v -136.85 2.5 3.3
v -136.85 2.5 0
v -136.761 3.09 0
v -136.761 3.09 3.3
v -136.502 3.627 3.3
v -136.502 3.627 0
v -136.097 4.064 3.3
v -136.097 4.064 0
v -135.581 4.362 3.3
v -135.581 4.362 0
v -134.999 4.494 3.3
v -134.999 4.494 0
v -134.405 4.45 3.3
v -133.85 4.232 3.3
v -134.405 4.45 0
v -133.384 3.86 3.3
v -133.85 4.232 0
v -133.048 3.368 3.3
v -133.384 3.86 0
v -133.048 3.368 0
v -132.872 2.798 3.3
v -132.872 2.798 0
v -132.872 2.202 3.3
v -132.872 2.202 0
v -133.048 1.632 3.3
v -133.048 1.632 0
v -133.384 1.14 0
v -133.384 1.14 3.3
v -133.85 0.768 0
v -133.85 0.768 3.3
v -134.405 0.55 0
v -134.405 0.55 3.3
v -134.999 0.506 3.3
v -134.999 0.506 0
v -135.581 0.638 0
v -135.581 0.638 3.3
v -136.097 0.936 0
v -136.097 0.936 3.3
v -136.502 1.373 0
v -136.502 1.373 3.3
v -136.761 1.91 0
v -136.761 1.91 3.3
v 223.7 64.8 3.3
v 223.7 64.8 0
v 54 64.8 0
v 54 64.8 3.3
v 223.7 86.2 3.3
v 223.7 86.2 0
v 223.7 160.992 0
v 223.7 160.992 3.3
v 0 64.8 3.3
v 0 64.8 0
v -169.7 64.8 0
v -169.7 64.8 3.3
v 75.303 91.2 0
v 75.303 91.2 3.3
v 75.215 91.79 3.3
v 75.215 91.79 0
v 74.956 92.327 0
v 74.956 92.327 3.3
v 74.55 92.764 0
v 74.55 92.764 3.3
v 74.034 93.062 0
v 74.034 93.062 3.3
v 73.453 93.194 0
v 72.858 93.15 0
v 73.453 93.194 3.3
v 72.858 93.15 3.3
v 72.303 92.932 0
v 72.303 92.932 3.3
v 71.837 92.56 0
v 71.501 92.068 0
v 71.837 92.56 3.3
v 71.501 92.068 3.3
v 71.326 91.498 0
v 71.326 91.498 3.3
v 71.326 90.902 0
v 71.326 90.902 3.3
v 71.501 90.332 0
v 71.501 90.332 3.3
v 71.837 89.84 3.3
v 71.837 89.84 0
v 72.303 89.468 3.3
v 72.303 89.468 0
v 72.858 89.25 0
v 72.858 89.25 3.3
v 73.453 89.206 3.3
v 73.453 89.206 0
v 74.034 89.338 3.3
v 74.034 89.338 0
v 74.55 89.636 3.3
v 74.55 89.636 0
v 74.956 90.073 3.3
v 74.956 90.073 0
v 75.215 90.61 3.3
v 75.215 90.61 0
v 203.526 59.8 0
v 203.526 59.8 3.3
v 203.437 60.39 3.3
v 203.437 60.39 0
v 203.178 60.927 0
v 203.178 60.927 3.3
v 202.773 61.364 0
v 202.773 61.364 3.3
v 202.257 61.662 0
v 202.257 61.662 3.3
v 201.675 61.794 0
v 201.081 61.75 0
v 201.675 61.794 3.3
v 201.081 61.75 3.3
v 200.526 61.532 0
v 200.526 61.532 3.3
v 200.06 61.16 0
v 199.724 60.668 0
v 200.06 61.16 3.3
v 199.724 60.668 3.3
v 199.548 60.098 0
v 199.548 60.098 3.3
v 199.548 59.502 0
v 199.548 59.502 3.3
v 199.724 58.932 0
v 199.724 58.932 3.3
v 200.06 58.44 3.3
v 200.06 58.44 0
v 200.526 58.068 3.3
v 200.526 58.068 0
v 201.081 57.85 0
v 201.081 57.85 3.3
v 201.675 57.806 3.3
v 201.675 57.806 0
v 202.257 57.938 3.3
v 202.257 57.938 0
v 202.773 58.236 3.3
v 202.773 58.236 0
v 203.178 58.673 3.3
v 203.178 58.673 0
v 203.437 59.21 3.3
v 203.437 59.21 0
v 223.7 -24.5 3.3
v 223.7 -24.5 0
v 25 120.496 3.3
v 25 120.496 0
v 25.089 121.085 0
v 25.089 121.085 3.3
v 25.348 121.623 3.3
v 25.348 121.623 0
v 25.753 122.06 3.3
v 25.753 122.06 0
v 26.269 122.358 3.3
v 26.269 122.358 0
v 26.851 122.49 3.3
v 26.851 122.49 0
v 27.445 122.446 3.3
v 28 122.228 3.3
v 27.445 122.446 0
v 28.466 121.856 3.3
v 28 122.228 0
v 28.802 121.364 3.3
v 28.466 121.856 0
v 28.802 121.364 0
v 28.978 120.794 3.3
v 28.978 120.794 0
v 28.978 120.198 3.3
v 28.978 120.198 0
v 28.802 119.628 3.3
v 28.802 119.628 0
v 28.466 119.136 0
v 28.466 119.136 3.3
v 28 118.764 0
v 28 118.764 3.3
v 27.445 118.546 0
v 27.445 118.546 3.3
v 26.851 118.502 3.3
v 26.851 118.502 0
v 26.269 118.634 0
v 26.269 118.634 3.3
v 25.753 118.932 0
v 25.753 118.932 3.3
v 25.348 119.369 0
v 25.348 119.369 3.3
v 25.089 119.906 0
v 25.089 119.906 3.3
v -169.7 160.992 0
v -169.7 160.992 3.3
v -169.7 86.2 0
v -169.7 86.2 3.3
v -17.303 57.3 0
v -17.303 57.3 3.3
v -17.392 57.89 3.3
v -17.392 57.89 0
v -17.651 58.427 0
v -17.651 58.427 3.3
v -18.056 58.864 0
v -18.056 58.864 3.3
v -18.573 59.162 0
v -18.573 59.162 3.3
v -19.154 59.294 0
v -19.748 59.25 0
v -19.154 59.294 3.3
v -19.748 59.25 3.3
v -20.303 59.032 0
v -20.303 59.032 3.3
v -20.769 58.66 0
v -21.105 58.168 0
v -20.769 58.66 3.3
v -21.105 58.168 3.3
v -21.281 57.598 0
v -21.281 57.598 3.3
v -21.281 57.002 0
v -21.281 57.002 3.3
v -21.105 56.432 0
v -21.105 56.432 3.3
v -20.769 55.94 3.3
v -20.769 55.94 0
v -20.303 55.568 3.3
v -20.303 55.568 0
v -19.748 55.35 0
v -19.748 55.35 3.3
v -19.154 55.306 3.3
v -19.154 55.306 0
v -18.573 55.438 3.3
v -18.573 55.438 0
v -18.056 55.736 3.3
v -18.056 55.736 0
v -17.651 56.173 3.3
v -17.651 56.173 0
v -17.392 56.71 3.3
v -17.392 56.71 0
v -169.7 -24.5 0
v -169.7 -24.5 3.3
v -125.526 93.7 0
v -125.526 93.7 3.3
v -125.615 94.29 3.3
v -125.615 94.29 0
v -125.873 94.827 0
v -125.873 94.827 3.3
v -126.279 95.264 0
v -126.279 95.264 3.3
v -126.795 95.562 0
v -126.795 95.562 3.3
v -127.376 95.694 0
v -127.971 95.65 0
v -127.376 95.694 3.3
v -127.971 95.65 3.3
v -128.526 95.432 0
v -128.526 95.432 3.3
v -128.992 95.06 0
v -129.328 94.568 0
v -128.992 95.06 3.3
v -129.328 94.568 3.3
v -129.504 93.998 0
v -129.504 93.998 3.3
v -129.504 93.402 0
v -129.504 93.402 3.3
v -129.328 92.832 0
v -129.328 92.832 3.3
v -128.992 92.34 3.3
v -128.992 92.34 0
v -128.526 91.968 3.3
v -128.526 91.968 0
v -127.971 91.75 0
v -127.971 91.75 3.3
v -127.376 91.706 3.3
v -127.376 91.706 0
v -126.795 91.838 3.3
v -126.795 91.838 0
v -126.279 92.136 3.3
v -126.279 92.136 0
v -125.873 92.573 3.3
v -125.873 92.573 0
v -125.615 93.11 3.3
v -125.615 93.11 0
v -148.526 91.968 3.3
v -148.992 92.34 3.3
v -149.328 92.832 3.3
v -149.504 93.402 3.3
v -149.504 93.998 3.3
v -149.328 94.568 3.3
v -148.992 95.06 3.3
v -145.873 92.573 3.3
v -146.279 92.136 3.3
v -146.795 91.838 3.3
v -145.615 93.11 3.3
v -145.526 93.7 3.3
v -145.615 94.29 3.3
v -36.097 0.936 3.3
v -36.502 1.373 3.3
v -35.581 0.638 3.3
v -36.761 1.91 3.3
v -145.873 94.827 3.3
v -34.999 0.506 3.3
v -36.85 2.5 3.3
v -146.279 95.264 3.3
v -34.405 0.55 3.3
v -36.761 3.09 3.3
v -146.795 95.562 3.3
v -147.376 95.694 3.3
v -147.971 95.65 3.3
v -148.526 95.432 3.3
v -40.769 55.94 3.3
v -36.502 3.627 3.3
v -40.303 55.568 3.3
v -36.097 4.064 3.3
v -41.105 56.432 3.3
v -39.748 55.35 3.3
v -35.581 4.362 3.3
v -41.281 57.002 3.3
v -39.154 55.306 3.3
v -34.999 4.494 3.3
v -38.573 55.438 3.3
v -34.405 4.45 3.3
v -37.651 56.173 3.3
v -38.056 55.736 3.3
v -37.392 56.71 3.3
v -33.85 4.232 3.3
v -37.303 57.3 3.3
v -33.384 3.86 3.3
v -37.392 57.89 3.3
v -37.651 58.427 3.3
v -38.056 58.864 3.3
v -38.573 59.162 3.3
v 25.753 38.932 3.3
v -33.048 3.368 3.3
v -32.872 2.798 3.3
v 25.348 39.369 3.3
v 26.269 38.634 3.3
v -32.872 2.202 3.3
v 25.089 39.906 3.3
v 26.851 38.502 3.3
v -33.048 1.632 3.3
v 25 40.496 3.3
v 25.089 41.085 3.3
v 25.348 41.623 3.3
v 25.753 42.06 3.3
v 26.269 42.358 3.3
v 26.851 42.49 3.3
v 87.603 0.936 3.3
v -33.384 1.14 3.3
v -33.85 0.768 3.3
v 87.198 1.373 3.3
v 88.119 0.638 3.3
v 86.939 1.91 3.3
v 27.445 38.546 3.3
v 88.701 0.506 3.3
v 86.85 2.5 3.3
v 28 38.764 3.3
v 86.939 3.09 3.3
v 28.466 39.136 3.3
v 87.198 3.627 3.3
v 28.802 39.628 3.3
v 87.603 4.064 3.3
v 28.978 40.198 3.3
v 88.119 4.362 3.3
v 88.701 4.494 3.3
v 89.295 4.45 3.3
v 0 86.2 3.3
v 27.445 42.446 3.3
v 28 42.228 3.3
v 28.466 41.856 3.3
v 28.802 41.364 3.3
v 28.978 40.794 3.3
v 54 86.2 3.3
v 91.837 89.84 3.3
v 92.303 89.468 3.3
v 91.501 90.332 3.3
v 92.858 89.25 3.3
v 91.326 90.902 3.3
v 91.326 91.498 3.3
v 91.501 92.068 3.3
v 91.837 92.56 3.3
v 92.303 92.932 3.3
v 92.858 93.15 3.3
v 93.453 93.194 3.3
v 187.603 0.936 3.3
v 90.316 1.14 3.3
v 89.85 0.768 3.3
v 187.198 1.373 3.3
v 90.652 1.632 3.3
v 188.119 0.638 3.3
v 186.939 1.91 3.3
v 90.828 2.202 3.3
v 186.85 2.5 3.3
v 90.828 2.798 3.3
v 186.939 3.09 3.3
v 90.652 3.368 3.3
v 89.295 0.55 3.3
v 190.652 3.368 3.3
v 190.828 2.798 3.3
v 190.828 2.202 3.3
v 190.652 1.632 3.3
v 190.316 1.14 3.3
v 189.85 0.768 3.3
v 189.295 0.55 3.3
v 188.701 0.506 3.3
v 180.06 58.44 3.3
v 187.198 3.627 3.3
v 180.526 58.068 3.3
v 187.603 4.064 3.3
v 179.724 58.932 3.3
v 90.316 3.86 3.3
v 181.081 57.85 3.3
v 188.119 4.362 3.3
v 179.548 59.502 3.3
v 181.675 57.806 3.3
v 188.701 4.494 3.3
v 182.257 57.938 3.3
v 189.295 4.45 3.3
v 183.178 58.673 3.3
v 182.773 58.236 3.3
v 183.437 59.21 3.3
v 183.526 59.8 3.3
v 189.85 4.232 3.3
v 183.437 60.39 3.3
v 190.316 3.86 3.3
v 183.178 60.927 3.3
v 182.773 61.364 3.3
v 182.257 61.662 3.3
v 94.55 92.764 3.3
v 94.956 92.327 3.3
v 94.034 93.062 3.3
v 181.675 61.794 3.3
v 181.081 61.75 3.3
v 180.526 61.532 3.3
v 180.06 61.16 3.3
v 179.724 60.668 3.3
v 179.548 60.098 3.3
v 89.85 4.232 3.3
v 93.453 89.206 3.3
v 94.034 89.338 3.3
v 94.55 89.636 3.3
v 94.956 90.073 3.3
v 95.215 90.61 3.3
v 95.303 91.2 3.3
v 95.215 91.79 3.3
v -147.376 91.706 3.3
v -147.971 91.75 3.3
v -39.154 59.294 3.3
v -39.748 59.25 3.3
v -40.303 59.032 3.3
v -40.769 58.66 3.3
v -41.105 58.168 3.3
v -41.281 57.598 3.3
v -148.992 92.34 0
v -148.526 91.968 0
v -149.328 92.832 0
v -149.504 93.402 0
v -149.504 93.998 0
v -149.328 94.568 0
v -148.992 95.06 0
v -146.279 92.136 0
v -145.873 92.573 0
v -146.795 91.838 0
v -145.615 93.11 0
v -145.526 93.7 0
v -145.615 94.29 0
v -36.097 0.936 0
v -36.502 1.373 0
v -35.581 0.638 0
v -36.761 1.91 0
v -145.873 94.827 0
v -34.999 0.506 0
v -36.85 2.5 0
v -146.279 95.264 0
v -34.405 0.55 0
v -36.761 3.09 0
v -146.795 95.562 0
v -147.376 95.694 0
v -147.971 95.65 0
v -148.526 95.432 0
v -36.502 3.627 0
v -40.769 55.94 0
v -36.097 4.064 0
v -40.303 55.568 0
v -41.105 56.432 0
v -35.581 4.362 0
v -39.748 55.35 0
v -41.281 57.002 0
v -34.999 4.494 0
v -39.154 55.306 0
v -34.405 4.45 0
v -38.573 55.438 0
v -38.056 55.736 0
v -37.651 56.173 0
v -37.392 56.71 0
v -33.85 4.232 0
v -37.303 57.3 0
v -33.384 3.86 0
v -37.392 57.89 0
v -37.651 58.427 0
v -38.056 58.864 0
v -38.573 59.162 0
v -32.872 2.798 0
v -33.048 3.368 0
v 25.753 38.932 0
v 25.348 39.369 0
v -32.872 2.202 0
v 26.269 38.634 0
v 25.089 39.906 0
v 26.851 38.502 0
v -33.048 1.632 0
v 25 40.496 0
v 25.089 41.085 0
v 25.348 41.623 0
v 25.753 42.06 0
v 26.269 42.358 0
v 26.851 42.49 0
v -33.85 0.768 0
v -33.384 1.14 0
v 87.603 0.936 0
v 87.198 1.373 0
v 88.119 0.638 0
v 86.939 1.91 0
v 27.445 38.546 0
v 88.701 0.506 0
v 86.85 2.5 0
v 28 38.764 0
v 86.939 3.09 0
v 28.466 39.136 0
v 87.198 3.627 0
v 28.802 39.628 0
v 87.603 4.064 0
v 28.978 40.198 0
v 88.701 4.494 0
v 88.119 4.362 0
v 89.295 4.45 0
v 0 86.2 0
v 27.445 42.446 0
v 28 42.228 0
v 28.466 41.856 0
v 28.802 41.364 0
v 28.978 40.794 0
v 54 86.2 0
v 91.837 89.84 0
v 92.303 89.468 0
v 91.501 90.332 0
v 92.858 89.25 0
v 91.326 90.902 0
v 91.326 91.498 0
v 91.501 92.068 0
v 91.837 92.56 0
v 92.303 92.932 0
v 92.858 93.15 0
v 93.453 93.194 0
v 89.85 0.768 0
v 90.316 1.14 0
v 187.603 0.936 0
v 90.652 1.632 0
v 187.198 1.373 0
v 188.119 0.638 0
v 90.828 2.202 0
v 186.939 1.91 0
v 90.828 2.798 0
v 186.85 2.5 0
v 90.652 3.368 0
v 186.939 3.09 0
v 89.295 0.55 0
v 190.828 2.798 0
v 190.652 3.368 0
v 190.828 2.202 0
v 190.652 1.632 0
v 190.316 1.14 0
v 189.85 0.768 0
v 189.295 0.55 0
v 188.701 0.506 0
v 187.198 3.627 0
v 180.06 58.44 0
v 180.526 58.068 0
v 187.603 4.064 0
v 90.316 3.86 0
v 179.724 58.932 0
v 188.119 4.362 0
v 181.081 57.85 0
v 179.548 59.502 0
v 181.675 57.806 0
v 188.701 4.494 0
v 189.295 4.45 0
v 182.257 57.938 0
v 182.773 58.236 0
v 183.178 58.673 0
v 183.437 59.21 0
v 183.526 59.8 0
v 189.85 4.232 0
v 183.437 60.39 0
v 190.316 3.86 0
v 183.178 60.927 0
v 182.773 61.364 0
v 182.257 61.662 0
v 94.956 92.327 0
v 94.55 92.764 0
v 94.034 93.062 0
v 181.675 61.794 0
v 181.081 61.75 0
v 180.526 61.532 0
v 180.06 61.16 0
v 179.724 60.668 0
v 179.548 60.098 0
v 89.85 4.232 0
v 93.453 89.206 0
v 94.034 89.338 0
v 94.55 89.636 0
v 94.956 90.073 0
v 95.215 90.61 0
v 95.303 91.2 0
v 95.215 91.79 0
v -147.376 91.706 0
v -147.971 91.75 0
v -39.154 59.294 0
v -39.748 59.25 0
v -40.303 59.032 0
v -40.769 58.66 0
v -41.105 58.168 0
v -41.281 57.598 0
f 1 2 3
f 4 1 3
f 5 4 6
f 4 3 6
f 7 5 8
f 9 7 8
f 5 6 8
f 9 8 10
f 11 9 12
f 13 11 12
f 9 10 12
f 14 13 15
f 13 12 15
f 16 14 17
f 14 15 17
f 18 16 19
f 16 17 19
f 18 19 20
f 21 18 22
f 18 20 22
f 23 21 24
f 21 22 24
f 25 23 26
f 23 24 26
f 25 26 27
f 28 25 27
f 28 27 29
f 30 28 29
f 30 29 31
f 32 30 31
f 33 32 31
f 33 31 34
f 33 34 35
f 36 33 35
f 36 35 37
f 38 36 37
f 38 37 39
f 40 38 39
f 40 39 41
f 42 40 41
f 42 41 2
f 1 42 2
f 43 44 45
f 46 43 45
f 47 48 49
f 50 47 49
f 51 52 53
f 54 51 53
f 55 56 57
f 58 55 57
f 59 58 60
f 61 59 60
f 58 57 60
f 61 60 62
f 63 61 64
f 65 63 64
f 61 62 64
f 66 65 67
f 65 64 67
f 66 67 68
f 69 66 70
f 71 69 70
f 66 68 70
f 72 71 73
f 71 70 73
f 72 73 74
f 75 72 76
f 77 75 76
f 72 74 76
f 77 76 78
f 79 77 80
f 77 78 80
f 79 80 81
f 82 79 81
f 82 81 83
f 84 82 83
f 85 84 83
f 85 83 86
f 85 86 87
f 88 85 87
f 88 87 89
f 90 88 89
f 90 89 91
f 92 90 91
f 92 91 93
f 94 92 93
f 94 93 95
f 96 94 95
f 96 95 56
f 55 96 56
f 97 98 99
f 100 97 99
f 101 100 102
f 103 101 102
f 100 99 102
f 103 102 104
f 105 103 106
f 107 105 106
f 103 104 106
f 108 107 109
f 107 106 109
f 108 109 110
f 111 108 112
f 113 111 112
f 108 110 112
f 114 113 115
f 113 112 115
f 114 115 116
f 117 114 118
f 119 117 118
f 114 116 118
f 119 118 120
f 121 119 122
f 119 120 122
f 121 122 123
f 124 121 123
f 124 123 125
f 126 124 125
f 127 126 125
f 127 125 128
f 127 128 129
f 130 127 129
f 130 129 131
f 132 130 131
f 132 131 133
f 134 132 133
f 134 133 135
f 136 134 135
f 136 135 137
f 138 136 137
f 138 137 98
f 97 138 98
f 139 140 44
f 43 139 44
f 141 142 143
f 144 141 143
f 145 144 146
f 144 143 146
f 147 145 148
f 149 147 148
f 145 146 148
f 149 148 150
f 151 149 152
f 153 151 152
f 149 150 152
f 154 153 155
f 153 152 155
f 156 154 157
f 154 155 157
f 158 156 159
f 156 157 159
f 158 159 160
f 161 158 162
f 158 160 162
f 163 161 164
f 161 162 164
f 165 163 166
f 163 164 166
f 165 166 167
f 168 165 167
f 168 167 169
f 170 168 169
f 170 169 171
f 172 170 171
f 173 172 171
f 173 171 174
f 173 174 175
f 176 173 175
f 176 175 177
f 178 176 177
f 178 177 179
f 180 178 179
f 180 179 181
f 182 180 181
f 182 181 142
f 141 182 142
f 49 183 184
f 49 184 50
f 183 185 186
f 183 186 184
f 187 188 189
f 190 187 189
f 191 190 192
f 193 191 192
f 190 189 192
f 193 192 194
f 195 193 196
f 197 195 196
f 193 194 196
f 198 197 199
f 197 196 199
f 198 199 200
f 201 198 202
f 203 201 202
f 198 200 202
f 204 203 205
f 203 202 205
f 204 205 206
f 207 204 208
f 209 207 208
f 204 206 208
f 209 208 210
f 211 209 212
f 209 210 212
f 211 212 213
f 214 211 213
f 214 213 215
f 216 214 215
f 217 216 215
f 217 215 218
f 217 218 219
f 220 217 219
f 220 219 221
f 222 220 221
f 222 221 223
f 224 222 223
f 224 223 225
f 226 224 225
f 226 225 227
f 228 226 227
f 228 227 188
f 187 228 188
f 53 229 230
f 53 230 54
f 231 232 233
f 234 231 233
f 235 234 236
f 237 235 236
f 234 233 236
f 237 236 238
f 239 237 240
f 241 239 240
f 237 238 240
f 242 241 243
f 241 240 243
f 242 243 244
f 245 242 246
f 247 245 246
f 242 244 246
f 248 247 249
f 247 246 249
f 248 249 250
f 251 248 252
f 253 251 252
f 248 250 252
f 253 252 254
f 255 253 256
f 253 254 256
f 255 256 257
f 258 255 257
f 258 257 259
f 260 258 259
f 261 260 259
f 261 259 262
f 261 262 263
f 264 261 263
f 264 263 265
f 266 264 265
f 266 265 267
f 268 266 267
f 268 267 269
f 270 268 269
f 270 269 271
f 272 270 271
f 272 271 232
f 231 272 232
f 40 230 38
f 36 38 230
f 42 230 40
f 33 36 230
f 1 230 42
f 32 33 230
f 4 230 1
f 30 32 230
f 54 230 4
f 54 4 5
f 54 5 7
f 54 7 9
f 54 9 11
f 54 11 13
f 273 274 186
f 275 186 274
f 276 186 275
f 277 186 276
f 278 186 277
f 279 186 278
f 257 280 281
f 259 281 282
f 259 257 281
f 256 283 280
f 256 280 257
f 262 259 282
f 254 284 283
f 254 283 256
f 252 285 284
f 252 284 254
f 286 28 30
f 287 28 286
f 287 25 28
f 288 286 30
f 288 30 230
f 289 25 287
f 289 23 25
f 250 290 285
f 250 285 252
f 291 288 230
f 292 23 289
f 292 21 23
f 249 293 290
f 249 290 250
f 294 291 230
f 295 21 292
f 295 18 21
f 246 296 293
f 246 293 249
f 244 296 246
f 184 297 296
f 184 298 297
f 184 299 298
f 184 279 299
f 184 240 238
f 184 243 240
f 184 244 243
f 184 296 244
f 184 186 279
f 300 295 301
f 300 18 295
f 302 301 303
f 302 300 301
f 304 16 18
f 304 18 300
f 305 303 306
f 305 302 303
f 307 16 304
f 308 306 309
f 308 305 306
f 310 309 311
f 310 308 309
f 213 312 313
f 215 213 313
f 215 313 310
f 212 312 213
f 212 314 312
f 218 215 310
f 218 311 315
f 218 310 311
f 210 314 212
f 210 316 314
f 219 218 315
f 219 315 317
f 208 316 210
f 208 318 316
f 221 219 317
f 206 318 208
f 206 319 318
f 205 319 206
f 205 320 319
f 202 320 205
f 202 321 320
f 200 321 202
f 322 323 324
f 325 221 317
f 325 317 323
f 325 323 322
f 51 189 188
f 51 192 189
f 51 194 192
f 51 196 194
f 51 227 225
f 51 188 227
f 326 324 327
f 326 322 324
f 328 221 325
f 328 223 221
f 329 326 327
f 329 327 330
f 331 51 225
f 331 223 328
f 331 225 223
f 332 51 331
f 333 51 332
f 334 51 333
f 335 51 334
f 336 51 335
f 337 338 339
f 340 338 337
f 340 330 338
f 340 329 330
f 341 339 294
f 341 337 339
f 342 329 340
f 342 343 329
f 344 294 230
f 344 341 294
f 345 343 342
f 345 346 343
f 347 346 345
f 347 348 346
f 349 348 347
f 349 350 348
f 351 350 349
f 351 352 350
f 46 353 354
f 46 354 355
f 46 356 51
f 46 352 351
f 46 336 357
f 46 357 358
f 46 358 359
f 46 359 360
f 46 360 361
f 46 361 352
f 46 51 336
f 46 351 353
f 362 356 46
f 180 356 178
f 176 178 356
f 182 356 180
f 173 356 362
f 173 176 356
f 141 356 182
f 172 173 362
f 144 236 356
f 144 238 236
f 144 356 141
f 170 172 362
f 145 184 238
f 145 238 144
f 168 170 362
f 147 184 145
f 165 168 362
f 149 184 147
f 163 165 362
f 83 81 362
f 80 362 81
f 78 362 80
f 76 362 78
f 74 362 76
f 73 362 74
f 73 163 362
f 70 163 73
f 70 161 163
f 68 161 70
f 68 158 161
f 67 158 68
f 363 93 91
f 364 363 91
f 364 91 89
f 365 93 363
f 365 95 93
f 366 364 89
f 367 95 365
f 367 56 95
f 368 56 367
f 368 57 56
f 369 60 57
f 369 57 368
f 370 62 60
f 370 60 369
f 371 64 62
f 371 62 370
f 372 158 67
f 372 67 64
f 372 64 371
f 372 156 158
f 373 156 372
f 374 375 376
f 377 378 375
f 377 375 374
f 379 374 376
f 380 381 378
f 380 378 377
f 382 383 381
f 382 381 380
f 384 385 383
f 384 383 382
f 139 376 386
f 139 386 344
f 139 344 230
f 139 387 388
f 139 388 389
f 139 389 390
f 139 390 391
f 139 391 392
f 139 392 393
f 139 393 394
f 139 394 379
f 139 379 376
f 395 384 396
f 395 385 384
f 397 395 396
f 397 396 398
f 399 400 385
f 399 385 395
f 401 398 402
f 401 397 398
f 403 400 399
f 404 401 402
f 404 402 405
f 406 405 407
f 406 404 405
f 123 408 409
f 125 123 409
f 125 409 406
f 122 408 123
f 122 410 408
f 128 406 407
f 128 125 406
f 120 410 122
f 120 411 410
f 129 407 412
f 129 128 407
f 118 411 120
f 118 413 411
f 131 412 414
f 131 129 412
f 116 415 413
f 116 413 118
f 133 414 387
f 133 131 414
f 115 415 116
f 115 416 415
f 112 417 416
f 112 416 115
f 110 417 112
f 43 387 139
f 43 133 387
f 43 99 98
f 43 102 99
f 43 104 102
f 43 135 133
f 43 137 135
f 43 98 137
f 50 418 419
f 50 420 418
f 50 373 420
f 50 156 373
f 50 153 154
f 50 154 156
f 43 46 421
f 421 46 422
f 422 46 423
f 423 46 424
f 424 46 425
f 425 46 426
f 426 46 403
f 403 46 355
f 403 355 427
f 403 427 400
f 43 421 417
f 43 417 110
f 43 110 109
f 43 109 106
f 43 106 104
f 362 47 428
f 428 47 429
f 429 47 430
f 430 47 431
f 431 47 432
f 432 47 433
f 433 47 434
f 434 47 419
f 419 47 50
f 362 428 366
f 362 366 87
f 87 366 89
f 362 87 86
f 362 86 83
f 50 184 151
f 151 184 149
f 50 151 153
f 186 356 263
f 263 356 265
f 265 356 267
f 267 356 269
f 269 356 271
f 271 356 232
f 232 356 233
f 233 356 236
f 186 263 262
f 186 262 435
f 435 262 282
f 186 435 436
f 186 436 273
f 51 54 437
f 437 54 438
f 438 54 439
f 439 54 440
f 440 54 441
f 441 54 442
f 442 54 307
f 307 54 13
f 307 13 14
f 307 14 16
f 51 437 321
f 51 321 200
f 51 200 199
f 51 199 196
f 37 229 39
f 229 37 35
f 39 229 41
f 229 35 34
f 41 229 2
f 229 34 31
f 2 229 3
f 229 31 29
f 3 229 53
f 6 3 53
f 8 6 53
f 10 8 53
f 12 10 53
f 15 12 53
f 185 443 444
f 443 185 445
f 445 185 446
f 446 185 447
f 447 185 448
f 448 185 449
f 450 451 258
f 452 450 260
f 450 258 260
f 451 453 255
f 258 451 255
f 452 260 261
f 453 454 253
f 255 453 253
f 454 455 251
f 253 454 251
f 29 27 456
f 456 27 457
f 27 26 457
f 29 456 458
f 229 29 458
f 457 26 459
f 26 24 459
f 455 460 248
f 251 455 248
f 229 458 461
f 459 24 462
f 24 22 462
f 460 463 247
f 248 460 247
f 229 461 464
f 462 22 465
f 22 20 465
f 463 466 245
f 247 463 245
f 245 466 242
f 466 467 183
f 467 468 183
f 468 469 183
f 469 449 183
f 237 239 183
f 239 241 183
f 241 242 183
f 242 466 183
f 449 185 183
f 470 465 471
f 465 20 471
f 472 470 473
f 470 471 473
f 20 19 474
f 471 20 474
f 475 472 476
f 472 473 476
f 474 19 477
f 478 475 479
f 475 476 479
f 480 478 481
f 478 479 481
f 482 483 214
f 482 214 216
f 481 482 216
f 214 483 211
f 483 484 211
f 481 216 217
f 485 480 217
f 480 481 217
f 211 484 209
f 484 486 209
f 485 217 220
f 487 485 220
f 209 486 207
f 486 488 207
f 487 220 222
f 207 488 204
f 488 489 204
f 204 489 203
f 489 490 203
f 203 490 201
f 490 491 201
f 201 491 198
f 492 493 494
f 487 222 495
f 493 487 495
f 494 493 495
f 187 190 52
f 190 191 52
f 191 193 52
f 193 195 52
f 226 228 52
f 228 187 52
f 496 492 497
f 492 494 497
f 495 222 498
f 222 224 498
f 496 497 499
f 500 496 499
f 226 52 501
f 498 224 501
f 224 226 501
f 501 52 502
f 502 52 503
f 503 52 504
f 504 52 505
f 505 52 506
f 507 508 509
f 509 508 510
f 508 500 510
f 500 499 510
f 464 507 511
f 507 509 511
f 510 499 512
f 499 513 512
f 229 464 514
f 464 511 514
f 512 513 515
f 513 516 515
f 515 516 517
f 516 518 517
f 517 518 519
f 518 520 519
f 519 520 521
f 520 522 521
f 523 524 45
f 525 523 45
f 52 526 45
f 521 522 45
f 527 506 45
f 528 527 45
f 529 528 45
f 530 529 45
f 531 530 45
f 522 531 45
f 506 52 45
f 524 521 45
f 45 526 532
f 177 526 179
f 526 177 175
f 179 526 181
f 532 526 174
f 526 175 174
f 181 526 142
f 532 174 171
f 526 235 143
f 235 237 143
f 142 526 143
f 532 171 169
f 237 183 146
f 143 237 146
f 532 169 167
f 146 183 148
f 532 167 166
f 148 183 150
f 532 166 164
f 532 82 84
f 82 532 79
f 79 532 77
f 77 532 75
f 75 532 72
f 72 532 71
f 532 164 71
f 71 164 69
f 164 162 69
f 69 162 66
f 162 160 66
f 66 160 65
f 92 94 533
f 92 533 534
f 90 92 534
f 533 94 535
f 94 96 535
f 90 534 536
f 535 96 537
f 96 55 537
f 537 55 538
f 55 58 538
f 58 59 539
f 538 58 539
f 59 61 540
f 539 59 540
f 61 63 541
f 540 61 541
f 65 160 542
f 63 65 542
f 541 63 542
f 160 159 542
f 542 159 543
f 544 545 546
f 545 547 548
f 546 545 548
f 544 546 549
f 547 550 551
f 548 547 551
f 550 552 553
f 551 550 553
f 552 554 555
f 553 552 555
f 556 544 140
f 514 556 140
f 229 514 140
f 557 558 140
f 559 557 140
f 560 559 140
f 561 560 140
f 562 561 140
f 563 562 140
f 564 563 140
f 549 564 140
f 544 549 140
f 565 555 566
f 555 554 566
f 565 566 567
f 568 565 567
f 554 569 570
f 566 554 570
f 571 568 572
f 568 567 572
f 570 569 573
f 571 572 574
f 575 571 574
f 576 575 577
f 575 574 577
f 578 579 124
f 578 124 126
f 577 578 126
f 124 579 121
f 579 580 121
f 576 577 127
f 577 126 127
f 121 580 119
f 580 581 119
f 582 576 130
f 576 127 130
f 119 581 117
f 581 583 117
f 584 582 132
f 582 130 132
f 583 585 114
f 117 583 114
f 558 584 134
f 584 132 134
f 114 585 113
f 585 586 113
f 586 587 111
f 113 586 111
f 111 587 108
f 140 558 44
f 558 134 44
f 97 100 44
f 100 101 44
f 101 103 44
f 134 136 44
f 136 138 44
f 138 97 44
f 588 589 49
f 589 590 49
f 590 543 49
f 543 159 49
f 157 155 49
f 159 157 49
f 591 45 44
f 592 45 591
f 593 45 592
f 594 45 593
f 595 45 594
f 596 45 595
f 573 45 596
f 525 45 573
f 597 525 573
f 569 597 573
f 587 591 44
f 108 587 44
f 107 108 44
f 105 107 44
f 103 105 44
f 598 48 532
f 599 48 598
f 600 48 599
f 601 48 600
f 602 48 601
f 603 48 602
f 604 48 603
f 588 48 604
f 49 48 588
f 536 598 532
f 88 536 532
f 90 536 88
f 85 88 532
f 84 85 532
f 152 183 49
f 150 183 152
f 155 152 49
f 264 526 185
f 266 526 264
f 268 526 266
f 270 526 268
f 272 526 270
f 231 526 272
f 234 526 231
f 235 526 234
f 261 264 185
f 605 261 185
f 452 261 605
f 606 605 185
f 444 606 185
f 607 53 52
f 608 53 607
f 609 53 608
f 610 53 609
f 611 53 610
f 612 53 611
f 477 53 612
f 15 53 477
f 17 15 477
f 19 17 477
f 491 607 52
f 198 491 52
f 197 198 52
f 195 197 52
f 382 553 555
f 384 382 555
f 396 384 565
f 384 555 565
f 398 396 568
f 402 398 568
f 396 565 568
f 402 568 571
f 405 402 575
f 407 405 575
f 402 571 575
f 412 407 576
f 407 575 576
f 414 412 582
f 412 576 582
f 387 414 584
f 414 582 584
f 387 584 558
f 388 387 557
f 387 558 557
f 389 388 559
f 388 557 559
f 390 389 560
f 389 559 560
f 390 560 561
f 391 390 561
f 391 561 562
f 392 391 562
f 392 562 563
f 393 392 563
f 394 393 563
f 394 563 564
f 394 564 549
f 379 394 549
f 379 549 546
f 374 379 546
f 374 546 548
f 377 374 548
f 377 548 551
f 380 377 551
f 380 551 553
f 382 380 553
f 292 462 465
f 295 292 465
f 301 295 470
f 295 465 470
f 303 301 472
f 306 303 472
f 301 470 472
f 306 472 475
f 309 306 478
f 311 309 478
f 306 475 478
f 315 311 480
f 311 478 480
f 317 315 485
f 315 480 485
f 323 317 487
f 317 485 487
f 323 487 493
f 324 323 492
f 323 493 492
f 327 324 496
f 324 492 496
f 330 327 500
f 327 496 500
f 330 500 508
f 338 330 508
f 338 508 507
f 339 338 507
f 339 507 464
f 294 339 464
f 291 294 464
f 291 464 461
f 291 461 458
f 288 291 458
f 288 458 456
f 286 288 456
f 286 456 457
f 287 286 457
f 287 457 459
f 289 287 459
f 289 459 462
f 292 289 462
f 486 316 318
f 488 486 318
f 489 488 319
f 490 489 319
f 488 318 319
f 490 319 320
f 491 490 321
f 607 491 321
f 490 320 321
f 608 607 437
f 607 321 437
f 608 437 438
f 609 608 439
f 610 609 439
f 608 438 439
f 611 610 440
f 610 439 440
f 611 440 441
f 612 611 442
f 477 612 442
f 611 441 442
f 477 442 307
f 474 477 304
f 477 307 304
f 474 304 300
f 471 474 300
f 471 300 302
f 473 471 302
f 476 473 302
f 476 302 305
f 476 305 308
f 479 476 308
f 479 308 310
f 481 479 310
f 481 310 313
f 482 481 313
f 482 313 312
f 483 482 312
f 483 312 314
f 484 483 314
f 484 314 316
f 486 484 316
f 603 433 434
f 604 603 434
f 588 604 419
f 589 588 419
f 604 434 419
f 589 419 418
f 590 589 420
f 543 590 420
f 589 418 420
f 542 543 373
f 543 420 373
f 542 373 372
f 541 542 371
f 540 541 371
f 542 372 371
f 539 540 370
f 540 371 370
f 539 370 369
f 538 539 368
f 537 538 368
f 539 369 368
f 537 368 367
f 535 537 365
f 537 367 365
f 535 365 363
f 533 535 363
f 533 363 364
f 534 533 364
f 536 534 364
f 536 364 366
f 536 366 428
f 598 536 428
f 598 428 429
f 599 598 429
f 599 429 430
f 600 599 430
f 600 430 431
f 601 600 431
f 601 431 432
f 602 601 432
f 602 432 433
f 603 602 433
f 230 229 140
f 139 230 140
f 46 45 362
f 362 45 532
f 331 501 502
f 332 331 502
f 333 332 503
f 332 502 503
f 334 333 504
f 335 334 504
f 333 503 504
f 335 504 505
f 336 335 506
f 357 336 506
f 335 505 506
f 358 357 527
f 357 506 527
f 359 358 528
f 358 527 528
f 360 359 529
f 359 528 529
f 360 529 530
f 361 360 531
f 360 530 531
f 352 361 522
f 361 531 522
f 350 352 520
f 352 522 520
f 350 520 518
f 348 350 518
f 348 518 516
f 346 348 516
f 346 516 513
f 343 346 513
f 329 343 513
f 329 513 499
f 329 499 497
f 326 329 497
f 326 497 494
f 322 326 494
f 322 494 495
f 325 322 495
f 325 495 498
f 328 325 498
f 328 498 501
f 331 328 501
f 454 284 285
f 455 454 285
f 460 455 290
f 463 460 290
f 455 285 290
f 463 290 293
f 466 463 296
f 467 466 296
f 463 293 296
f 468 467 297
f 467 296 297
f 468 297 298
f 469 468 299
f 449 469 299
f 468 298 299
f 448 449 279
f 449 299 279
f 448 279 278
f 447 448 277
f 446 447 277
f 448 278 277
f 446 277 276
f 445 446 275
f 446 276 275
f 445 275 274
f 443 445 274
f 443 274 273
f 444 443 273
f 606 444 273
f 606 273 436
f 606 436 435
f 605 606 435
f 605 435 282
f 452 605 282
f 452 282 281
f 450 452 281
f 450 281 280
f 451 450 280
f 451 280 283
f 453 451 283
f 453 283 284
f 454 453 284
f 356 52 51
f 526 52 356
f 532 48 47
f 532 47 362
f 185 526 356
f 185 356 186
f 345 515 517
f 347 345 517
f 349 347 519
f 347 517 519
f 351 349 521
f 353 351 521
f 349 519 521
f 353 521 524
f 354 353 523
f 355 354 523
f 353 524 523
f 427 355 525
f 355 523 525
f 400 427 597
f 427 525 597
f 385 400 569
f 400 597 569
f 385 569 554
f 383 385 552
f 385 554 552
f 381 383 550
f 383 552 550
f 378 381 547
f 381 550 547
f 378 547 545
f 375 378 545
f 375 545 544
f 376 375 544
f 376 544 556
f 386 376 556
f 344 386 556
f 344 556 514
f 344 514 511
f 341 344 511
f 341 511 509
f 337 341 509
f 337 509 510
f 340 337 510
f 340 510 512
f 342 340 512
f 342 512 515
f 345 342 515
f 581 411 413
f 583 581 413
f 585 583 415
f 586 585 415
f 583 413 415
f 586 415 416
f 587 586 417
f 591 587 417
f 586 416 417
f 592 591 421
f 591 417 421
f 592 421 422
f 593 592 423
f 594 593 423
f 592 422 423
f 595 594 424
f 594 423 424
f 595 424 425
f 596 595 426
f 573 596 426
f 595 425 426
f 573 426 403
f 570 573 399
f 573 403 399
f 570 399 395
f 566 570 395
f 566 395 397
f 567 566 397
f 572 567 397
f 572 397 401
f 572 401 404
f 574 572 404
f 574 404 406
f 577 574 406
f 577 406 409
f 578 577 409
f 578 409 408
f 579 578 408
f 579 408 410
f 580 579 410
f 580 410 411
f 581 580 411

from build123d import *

# Parameters (mm, degrees)
SKETCH1_W           = 393.4
SKETCH1_H           = 185.491905347
BOSS_EXTRUDE1_DEPTH = 3.3
SKETCH2_R           = 2.00000001
SKETCH2_R_2         = 2
CUT_EXTRUDE1_DEPTH  = 4
SKETCH3_W           = 169.7
SKETCH3_H           = 21.4
CUT_EXTRUDE2_DEPTH  = 6
SKETCH4_R           = 2
CUT_EXTRUDE3_DEPTH  = 276.628325081


with BuildPart() as part:
    # Sketch1 → Boss-Extrude1 (new body)
    with BuildSketch(Plane.XY):
        with Locations((27, 68.245952673)):
            Rectangle(SKETCH1_W, SKETCH1_H)
    extrude(amount=BOSS_EXTRUDE1_DEPTH)

    # Sketch2 → Cut-Extrude1 (cut)
    with BuildSketch(Plane(origin=(0, 0, 0), x_dir=(-1, 0, 0), z_dir=(0, 0, -1))):
        with Locations((-27, 40.495952673)):
            Circle(SKETCH2_R)
        with Locations((-27, 120.495952673)):
            Circle(SKETCH2_R)
        with Locations((-188.85, 2.5)):
            Circle(SKETCH2_R_2)
        with Locations((-88.85, 2.5)):
            Circle(SKETCH2_R_2)
        with Locations((34.85, 2.5)):
            Circle(SKETCH2_R_2)
        with Locations((134.85, 2.5)):
            Circle(SKETCH2_R_2)
    extrude(amount=-CUT_EXTRUDE1_DEPTH, mode=Mode.SUBTRACT)

    # Sketch3 → Cut-Extrude2 (cut)
    with BuildSketch(Plane(origin=(0, 0, 0), x_dir=(-1, 0, 0), z_dir=(0, 0, -1))):
        with Locations((84.85, 75.5)):
            Rectangle(SKETCH3_W, SKETCH3_H)
        with Locations((-138.85, 75.5)):
            Rectangle(SKETCH3_W, SKETCH3_H)
    extrude(amount=-CUT_EXTRUDE2_DEPTH, mode=Mode.SUBTRACT)

    # Sketch4 → Cut-Extrude3 (cut, through all)
    with BuildSketch(Plane.XY.offset(3.3)):
        with Locations((93.303368669, 91.2)):
            Circle(SKETCH4_R)
        with Locations((73.303368669, 91.2)):
            Circle(SKETCH4_R)
        with Locations((181.525840122, 59.8)):
            Circle(SKETCH4_R)
        with Locations((201.525840122, 59.8)):
            Circle(SKETCH4_R)
        with Locations((-127.525840122, 93.7)):
            Circle(SKETCH4_R)
        with Locations((-147.525840122, 93.7)):
            Circle(SKETCH4_R)
        with Locations((-19.303368669, 57.3)):
            Circle(SKETCH4_R)
        with Locations((-39.303368669, 57.3)):
            Circle(SKETCH4_R)
    extrude(amount=-CUT_EXTRUDE3_DEPTH, mode=Mode.SUBTRACT)


solid = part.part
